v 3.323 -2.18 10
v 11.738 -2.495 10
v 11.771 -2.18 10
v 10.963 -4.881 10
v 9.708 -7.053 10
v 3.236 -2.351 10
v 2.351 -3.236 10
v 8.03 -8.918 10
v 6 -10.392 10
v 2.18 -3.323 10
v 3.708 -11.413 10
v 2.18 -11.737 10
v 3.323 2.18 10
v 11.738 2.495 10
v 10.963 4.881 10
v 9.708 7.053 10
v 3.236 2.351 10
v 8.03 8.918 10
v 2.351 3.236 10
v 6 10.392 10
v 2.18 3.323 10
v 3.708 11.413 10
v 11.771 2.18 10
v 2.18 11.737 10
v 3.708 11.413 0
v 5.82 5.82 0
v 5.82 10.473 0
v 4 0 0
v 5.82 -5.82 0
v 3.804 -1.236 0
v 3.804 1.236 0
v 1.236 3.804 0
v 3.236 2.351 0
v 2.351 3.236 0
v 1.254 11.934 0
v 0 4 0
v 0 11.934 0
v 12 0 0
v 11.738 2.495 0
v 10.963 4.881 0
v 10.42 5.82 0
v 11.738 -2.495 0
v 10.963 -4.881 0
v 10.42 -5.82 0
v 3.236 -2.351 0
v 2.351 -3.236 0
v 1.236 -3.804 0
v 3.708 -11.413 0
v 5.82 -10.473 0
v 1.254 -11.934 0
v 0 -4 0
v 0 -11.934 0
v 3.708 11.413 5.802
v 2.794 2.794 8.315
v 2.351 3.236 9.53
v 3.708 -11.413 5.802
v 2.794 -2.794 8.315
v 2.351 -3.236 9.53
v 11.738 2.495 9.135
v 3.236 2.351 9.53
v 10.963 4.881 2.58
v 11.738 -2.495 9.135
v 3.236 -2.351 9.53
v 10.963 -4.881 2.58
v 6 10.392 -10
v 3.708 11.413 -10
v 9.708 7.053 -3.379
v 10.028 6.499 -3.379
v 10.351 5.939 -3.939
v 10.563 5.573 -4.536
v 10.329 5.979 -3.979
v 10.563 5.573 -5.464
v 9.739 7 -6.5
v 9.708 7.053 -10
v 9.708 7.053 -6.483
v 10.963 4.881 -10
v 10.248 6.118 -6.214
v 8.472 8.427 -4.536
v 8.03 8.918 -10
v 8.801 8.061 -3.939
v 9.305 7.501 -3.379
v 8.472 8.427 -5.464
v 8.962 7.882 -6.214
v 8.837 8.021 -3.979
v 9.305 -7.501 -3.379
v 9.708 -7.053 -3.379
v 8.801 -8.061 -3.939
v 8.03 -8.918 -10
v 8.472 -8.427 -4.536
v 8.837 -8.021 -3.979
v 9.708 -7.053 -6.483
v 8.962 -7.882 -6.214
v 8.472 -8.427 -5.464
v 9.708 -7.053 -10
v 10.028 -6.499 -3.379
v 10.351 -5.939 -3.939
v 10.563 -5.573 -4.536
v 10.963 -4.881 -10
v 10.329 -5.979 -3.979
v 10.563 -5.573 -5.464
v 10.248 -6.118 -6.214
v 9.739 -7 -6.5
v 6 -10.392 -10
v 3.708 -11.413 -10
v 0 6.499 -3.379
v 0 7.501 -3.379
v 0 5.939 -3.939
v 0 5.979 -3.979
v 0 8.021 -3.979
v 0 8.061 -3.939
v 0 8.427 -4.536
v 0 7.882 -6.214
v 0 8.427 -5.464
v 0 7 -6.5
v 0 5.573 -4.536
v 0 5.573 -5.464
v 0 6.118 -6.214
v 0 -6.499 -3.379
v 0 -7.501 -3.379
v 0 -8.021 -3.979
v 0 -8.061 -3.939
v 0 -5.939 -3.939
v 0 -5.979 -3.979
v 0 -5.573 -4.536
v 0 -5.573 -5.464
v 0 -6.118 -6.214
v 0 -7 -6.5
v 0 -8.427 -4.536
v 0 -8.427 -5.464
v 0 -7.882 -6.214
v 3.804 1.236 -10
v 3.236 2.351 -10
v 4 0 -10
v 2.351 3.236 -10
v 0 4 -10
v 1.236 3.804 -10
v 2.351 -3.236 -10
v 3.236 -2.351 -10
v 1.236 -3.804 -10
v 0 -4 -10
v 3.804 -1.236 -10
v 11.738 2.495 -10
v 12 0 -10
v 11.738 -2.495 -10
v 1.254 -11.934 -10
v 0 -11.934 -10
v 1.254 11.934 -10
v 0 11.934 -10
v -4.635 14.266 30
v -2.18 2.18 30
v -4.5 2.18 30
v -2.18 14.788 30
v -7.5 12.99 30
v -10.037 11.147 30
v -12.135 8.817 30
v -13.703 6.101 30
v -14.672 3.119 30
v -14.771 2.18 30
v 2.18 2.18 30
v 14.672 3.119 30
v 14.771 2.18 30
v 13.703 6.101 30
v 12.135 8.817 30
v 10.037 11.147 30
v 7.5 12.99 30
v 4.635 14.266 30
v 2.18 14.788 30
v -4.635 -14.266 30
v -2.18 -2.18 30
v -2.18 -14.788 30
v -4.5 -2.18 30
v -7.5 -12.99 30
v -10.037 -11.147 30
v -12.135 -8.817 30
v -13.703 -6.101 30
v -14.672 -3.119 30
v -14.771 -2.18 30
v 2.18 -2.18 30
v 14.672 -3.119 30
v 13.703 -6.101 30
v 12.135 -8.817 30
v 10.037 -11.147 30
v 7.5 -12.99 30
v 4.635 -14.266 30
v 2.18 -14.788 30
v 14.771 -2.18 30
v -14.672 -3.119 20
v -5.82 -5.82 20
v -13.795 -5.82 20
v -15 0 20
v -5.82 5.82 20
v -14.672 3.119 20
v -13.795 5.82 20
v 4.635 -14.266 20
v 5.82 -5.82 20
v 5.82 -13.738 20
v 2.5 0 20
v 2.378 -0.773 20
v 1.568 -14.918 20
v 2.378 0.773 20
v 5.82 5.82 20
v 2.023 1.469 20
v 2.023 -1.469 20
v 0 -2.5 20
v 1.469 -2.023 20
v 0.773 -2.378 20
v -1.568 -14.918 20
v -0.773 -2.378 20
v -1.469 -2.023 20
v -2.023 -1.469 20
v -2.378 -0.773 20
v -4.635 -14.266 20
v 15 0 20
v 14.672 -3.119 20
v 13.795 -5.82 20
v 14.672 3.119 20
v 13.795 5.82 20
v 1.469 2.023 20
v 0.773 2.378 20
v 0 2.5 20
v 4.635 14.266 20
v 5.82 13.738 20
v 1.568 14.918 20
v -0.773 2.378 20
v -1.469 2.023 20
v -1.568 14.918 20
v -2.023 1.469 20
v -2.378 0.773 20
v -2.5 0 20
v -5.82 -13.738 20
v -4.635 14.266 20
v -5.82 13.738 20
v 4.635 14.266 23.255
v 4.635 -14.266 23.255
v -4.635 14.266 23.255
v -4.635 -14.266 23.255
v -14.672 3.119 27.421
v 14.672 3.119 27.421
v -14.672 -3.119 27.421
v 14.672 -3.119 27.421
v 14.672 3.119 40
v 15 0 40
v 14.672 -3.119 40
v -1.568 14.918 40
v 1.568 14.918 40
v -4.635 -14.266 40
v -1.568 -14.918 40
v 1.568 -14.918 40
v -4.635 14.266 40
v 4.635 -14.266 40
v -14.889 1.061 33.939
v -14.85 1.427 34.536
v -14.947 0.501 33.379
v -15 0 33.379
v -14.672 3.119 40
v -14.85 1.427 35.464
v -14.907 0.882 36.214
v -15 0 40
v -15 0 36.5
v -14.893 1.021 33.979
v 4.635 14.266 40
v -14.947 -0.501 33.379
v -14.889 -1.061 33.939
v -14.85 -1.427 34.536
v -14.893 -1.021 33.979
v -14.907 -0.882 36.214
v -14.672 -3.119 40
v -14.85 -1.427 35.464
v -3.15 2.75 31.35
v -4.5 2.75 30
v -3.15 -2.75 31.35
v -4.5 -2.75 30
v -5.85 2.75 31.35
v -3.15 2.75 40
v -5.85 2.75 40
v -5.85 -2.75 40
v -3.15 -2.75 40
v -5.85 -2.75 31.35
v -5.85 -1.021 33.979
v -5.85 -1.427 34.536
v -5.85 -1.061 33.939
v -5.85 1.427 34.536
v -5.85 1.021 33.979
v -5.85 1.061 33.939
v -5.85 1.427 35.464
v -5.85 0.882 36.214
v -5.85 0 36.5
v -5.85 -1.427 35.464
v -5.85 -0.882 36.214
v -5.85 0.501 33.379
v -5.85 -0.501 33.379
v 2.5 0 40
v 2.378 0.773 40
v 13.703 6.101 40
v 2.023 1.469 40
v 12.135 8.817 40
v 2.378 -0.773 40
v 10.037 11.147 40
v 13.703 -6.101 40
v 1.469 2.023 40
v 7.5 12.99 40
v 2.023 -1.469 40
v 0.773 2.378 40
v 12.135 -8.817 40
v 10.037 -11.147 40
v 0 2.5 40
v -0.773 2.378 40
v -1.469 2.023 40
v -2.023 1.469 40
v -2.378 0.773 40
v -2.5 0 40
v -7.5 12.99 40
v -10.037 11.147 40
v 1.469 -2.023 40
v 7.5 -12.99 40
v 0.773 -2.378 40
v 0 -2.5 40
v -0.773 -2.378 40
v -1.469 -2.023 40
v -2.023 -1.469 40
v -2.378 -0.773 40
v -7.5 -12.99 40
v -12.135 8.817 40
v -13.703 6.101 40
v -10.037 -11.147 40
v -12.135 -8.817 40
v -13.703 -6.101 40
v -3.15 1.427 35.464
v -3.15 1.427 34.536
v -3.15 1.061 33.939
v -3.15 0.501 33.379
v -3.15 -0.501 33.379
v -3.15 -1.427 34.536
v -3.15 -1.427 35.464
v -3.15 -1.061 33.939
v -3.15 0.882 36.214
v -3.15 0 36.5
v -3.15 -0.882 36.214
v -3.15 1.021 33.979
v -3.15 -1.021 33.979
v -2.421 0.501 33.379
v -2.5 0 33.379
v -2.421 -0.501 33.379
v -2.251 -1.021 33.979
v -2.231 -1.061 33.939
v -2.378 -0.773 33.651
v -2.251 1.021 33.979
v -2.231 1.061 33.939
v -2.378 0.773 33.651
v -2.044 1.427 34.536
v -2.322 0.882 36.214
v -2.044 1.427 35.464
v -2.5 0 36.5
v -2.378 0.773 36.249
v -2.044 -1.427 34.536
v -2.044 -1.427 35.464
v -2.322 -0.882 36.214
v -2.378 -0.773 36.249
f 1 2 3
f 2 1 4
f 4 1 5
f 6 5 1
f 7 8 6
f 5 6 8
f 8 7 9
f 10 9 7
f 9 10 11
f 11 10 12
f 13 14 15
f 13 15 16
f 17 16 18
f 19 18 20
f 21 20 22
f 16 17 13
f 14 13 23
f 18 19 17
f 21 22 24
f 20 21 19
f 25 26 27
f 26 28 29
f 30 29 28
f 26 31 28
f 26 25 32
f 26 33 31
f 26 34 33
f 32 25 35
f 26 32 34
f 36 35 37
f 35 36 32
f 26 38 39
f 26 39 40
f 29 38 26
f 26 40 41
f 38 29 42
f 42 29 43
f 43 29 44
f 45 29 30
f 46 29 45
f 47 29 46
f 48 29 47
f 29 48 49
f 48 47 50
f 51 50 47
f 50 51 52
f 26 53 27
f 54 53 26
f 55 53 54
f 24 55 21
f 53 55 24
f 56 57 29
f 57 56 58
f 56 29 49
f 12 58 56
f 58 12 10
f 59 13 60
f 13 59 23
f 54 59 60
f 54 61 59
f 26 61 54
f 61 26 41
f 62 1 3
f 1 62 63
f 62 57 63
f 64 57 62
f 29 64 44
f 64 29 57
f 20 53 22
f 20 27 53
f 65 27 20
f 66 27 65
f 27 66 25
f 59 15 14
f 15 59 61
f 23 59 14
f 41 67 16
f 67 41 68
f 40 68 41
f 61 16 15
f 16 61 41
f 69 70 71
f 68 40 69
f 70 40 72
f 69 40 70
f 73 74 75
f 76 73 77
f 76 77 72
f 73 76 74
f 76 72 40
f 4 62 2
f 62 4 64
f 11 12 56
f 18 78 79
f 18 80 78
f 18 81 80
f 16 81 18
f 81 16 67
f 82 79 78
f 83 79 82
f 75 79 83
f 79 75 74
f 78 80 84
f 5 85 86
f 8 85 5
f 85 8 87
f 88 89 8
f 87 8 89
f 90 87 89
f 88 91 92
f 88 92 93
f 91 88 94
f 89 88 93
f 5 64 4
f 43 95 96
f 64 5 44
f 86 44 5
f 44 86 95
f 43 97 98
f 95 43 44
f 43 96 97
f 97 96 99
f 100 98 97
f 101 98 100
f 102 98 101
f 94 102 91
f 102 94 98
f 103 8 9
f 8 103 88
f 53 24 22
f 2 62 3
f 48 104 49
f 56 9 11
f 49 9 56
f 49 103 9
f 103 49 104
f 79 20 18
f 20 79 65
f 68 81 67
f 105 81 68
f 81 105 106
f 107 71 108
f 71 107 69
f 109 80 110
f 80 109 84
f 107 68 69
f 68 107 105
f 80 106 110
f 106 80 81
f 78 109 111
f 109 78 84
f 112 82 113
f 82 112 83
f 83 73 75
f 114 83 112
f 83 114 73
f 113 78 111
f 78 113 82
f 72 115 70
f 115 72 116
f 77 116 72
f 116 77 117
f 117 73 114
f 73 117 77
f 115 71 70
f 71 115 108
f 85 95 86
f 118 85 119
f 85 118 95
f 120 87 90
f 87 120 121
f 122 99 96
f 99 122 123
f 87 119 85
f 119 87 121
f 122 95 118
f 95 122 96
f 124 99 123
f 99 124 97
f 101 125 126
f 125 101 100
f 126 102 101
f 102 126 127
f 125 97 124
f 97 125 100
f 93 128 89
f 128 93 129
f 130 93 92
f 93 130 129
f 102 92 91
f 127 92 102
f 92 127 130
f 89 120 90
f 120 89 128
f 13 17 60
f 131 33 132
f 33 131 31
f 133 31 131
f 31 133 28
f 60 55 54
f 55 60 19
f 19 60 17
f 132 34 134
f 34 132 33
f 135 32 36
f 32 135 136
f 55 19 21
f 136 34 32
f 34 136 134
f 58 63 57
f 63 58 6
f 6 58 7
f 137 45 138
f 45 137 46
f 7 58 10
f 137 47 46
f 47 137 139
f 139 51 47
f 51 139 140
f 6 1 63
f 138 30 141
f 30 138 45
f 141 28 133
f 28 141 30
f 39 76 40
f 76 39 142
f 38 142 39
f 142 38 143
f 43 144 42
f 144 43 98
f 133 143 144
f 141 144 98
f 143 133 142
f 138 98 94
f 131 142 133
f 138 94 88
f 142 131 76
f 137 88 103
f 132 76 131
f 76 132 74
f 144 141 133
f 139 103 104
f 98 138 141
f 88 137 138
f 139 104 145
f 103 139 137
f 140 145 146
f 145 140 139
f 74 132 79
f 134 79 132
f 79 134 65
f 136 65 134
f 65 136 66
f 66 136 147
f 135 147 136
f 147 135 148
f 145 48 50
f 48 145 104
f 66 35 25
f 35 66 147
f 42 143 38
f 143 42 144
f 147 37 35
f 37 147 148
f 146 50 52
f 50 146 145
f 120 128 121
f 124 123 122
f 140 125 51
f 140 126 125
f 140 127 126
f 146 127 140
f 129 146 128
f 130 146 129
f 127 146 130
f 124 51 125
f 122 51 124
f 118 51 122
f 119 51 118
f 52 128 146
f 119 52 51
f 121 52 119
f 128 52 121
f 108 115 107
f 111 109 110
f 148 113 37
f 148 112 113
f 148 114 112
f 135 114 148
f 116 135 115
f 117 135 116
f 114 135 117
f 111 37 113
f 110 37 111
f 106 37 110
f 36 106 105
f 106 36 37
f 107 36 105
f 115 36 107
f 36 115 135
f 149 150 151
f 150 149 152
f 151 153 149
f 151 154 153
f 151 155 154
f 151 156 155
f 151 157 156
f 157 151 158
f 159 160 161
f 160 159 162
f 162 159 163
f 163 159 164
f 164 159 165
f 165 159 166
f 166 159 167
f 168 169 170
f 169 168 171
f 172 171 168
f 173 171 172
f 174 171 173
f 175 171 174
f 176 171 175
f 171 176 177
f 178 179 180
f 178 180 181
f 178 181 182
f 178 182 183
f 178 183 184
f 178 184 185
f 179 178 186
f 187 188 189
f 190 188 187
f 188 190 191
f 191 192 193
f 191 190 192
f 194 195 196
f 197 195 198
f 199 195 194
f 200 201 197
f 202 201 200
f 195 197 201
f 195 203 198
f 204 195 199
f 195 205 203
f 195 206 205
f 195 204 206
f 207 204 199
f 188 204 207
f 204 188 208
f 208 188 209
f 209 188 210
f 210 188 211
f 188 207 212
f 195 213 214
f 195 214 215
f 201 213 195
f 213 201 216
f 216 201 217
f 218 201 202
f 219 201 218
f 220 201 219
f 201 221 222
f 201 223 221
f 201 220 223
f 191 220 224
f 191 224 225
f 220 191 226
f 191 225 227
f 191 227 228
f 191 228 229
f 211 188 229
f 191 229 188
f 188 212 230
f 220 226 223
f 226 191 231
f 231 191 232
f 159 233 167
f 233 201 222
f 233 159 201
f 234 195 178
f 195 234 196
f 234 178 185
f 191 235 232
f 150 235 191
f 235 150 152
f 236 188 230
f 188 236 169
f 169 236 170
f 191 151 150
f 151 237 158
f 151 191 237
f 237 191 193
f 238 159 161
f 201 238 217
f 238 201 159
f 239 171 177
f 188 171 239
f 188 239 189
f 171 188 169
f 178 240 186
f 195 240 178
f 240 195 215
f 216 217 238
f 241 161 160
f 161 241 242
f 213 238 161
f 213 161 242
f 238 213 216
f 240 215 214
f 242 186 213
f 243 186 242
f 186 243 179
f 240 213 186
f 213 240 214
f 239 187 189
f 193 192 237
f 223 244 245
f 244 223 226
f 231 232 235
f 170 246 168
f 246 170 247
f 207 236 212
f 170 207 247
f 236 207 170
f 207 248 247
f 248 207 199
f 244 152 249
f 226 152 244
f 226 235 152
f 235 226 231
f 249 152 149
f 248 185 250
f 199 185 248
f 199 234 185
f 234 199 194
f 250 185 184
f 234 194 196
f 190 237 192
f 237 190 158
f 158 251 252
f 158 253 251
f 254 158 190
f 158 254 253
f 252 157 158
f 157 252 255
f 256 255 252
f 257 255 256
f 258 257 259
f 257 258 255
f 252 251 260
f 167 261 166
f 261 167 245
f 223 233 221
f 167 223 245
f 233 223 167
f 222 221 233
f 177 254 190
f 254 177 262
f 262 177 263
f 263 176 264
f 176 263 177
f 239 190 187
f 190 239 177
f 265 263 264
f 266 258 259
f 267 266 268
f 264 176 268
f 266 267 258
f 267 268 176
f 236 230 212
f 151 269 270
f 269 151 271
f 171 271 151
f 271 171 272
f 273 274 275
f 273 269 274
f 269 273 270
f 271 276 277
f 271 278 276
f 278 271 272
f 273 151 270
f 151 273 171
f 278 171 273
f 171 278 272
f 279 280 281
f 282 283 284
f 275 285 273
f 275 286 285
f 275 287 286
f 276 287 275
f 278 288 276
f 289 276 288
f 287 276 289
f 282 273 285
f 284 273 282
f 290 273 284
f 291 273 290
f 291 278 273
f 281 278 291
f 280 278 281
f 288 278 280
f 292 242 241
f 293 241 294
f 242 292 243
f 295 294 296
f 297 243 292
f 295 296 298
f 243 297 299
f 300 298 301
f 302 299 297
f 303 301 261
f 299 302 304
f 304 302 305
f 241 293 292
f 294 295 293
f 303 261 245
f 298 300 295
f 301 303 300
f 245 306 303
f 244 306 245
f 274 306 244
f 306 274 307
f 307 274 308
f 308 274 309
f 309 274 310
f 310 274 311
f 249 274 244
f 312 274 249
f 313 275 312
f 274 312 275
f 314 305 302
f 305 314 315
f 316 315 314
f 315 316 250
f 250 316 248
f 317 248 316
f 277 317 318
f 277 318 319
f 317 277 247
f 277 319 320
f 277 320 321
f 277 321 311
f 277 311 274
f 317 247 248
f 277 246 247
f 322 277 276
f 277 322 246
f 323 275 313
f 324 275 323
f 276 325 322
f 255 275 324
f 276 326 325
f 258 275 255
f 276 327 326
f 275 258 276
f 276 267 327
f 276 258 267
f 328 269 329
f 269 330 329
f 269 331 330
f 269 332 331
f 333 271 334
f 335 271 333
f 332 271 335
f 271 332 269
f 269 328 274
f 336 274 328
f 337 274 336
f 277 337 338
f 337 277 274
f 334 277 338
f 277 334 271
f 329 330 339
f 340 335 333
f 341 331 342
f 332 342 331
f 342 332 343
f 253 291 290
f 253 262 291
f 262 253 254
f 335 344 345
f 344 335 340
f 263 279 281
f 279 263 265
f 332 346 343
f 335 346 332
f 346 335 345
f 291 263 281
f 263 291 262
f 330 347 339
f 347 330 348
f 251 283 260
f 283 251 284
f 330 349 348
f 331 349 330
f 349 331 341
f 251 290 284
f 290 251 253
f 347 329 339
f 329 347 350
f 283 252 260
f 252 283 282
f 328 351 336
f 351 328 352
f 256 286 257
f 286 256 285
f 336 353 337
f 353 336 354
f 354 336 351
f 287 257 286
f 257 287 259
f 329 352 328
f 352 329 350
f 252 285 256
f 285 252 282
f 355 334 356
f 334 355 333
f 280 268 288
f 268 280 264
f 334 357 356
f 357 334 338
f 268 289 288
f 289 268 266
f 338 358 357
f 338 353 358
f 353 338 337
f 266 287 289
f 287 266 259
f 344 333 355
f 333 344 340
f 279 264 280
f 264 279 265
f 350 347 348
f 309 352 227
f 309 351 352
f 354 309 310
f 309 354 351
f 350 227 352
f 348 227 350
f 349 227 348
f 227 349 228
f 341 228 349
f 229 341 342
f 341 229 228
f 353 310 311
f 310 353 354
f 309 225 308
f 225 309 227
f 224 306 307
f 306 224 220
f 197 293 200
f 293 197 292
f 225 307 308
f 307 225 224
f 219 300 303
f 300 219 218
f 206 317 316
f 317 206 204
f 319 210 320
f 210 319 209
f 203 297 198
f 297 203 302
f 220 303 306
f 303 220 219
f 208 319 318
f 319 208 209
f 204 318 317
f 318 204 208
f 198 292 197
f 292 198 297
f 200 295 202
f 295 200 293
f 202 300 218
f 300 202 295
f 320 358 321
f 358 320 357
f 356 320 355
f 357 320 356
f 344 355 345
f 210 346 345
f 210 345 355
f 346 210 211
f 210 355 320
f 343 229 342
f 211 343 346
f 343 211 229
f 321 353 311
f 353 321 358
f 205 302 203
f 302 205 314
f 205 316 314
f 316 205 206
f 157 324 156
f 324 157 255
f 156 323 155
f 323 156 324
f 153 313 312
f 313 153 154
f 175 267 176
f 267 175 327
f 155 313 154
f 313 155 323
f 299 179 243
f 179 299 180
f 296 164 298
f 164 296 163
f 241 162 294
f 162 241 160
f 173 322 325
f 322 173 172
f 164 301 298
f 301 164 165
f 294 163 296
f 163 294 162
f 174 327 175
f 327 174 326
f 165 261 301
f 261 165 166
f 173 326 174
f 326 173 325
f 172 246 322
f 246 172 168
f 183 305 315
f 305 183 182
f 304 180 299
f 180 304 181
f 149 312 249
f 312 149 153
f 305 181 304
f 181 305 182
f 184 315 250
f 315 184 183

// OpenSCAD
screwsize=3;
pi = 3.1415926;

// Make a cuboid with a 45 degree top for vertical slots etc

module cen_hat(size)
{
	translate([0, 0, size.x/sqrt(2)])
		union()
		{
			rotate([0, 45, 0])
				cube([size.x, size.y, 5*max(size.x, max(size.y, size.z))], center=true);
			rotate([0, -45, 0])
				cube([size.x, size.y, 5*max(size.x, max(size.y, size.z))], center=true);
		}
}

module hat_cube(size = [1,1,1], center = false)
{
	difference()
	{
		cube(size, center);
		if(center)
			translate([0, 0, size.z/2])
				cen_hat(size);
		else
			translate([size.x/2, size.y/2, size.z])
				cen_hat(size);
	}
}

// Make a RepRap teardrop with its axis along Z
// If truncated is true, chop the apex; if not, come to a point

// I stole this function from Erik...

// If teardrop_angle is negative, this just gives an ordinary cylinder.  If it is zero or positive, the 
// teardrop is rotated through that angle.  Other arguments are as for the standard cylinder function.

module teardrop_internal(r=1.5, h=20, teardrop_angle=-1, truncateMM=0.5)
{
	if(teardrop_angle < 0)
		cylinder(r=r, h=h, center=false, $fn=max(2*r, 10));
	 else
		rotate([0, 0, teardrop_angle])
			union()
			{
				if(truncateMM > 0)
				{
					intersection()
					{
						translate([truncateMM,0,h/2]) 
							scale([1,1,h])
								cube([r*2.8275,r*2,1],center=true);
						scale([1,1,h]) 
								rotate([0,0,3*45])
									cube([r,r,1]);
					}
				} else
				{
					scale([1,1,h])
						rotate([0,0,3*45])
							cube([r,r,1]);
				}
				cylinder(r=r, h = h, center=false, $fn=max(2*r, 10));
		}
}

module teardrop(r=1.5, h=20, center=false, teardrop_angle=-1, truncateMM=0.5)
{
	if(center)
		translate([0, 0, -h/2])
			teardrop_internal(r=r, h=h, teardrop_angle=teardrop_angle, truncateMM=truncateMM);
	else
		teardrop_internal(r=r, h=h, teardrop_angle=teardrop_angle, truncateMM=truncateMM);
}



module tooth_gap(height = 10, number_of_teeth = 11, inner_radius = 10, dr = 3,  angle=7)
{
	linear_extrude(height = 2*height, center = true, convexity = 10, twist = 0)
		polygon( points = [
			[pi*inner_radius/(2*number_of_teeth), 0],
			[-pi*inner_radius/(2*number_of_teeth), 0],
			[-2*dr *sin(angle) - pi*inner_radius/(2*number_of_teeth), 2*dr],
			[2*dr *sin(angle) + pi*inner_radius/(2*number_of_teeth), 2*dr],
		], convexity = 3);
}

module trapezium(s=[1,2,3], angle = 10)
{
	difference()
	{
		cube([s.x + 1.1*s.z*tan(angle), s.y + 1.1*s.z*tan(angle), s.z], center=true);
		translate([s.x/2 + s.x/(2*cos(angle)),0,0])
			rotate([0,-angle,0])
				cube([s.x,3*s.y,3*s.z], center=true);
		translate([-s.x/2 - s.x/(2*cos(angle)),0,0])
			rotate([0,angle,0])
				cube([s.x,3*s.y,3*s.z], center=true);

	}
}



module hub_holes(hub_height=10, hub_radius = 9.5, shaft_radius = 2.5, side_holes=false)
{

	union()
	{	
		cylinder(h = hub_height*10, r = shaft_radius, center=true,$fn=20);
		if(!side_holes)
		{
		translate([shaft_radius + 2, 0, -hub_height/2])
			hat_cube([2.7,5.5,hub_height], center=true);
		translate([0,0,-hub_height/2])
			rotate([0,90,0])
					teardrop(h = 2*hub_radius, r = screwsize/2, center=false, teardrop_angle=0, truncateMM=0.5);
		} else
		{
		translate([-2*hub_radius, shaft_radius+3,-hub_height/2])
			rotate([0,90,0])
					teardrop(h = 8*hub_radius, r = screwsize/2, center=false, teardrop_angle=0, truncateMM=0.5);
		translate([-2*hub_radius, -shaft_radius-3,-hub_height/2])
			rotate([0,90,0])
					teardrop(h = 8*hub_radius, r = screwsize/2, center=false, teardrop_angle=0, truncateMM=0.5);
		}
	}
}

module hub(hub_height=10, hub_radius = 9.5, shaft_radius = 2.5, side_holes=false)
{
	difference()
	{
		translate([0,0,-hub_height/2])
			cylinder(h = hub_height , r = hub_radius, center=true, $fn=30);
		hub_holes(hub_height=hub_height, hub_radius = hub_radius, shaft_radius = shaft_radius, side_holes=side_holes);
	}
}


module flex_femalei(r=12)
{

union()
{
difference()
{
translate([0,0,5])
//rotate([0,180,0])
difference()
{
	cylinder(h = 10, r = r, center=true, $fn=30);
	union()
	{
		trapezium(s=[8, 3*r, 10],angle=20);
		rotate([0,0,90])
			trapezium(s=[8, 3*r, 10],angle=20);
	}
}
hub_holes(hub_height=10, hub_radius = r, shaft_radius = 4,side_holes=true);
}

hub(hub_height=10, hub_radius = r, shaft_radius =4,side_holes=true);
}


}


module flex_female(r=12, left=true)
{
	if(left)
	{
		intersection()
		{
			translate([50,0,0])
				cube([100,100,100],center=true);
			flex_femalei(r=12);
		}
	}else
	{
		difference()
		{
			translate([50,0,0])
				cube([100,100,100],center=true);
			flex_femalei(r=12);
		}
	}	
}




module flex_male(r=12)
{
union()
{
difference()
{
translate([0,0,5])
rotate([0,180,0])
intersection()
{
	cylinder(h = 20, r = r, center=true, $fn=30);
	union()
	{
		trapezium(s=[8, 3*r, 10],angle=20);
		rotate([0,0,90])
			trapezium(s=[8, 3*r, 10],angle=20);
	}
}
hub_holes(hub_height=10, hub_radius = r, shaft_radius = 2.5);
}

hub(hub_height=10, hub_radius = r, shaft_radius = 2.5);
}
}

flex_female(r=15);

translate([0,0,30])
rotate([0,180,0])
flex_male(r=15);
